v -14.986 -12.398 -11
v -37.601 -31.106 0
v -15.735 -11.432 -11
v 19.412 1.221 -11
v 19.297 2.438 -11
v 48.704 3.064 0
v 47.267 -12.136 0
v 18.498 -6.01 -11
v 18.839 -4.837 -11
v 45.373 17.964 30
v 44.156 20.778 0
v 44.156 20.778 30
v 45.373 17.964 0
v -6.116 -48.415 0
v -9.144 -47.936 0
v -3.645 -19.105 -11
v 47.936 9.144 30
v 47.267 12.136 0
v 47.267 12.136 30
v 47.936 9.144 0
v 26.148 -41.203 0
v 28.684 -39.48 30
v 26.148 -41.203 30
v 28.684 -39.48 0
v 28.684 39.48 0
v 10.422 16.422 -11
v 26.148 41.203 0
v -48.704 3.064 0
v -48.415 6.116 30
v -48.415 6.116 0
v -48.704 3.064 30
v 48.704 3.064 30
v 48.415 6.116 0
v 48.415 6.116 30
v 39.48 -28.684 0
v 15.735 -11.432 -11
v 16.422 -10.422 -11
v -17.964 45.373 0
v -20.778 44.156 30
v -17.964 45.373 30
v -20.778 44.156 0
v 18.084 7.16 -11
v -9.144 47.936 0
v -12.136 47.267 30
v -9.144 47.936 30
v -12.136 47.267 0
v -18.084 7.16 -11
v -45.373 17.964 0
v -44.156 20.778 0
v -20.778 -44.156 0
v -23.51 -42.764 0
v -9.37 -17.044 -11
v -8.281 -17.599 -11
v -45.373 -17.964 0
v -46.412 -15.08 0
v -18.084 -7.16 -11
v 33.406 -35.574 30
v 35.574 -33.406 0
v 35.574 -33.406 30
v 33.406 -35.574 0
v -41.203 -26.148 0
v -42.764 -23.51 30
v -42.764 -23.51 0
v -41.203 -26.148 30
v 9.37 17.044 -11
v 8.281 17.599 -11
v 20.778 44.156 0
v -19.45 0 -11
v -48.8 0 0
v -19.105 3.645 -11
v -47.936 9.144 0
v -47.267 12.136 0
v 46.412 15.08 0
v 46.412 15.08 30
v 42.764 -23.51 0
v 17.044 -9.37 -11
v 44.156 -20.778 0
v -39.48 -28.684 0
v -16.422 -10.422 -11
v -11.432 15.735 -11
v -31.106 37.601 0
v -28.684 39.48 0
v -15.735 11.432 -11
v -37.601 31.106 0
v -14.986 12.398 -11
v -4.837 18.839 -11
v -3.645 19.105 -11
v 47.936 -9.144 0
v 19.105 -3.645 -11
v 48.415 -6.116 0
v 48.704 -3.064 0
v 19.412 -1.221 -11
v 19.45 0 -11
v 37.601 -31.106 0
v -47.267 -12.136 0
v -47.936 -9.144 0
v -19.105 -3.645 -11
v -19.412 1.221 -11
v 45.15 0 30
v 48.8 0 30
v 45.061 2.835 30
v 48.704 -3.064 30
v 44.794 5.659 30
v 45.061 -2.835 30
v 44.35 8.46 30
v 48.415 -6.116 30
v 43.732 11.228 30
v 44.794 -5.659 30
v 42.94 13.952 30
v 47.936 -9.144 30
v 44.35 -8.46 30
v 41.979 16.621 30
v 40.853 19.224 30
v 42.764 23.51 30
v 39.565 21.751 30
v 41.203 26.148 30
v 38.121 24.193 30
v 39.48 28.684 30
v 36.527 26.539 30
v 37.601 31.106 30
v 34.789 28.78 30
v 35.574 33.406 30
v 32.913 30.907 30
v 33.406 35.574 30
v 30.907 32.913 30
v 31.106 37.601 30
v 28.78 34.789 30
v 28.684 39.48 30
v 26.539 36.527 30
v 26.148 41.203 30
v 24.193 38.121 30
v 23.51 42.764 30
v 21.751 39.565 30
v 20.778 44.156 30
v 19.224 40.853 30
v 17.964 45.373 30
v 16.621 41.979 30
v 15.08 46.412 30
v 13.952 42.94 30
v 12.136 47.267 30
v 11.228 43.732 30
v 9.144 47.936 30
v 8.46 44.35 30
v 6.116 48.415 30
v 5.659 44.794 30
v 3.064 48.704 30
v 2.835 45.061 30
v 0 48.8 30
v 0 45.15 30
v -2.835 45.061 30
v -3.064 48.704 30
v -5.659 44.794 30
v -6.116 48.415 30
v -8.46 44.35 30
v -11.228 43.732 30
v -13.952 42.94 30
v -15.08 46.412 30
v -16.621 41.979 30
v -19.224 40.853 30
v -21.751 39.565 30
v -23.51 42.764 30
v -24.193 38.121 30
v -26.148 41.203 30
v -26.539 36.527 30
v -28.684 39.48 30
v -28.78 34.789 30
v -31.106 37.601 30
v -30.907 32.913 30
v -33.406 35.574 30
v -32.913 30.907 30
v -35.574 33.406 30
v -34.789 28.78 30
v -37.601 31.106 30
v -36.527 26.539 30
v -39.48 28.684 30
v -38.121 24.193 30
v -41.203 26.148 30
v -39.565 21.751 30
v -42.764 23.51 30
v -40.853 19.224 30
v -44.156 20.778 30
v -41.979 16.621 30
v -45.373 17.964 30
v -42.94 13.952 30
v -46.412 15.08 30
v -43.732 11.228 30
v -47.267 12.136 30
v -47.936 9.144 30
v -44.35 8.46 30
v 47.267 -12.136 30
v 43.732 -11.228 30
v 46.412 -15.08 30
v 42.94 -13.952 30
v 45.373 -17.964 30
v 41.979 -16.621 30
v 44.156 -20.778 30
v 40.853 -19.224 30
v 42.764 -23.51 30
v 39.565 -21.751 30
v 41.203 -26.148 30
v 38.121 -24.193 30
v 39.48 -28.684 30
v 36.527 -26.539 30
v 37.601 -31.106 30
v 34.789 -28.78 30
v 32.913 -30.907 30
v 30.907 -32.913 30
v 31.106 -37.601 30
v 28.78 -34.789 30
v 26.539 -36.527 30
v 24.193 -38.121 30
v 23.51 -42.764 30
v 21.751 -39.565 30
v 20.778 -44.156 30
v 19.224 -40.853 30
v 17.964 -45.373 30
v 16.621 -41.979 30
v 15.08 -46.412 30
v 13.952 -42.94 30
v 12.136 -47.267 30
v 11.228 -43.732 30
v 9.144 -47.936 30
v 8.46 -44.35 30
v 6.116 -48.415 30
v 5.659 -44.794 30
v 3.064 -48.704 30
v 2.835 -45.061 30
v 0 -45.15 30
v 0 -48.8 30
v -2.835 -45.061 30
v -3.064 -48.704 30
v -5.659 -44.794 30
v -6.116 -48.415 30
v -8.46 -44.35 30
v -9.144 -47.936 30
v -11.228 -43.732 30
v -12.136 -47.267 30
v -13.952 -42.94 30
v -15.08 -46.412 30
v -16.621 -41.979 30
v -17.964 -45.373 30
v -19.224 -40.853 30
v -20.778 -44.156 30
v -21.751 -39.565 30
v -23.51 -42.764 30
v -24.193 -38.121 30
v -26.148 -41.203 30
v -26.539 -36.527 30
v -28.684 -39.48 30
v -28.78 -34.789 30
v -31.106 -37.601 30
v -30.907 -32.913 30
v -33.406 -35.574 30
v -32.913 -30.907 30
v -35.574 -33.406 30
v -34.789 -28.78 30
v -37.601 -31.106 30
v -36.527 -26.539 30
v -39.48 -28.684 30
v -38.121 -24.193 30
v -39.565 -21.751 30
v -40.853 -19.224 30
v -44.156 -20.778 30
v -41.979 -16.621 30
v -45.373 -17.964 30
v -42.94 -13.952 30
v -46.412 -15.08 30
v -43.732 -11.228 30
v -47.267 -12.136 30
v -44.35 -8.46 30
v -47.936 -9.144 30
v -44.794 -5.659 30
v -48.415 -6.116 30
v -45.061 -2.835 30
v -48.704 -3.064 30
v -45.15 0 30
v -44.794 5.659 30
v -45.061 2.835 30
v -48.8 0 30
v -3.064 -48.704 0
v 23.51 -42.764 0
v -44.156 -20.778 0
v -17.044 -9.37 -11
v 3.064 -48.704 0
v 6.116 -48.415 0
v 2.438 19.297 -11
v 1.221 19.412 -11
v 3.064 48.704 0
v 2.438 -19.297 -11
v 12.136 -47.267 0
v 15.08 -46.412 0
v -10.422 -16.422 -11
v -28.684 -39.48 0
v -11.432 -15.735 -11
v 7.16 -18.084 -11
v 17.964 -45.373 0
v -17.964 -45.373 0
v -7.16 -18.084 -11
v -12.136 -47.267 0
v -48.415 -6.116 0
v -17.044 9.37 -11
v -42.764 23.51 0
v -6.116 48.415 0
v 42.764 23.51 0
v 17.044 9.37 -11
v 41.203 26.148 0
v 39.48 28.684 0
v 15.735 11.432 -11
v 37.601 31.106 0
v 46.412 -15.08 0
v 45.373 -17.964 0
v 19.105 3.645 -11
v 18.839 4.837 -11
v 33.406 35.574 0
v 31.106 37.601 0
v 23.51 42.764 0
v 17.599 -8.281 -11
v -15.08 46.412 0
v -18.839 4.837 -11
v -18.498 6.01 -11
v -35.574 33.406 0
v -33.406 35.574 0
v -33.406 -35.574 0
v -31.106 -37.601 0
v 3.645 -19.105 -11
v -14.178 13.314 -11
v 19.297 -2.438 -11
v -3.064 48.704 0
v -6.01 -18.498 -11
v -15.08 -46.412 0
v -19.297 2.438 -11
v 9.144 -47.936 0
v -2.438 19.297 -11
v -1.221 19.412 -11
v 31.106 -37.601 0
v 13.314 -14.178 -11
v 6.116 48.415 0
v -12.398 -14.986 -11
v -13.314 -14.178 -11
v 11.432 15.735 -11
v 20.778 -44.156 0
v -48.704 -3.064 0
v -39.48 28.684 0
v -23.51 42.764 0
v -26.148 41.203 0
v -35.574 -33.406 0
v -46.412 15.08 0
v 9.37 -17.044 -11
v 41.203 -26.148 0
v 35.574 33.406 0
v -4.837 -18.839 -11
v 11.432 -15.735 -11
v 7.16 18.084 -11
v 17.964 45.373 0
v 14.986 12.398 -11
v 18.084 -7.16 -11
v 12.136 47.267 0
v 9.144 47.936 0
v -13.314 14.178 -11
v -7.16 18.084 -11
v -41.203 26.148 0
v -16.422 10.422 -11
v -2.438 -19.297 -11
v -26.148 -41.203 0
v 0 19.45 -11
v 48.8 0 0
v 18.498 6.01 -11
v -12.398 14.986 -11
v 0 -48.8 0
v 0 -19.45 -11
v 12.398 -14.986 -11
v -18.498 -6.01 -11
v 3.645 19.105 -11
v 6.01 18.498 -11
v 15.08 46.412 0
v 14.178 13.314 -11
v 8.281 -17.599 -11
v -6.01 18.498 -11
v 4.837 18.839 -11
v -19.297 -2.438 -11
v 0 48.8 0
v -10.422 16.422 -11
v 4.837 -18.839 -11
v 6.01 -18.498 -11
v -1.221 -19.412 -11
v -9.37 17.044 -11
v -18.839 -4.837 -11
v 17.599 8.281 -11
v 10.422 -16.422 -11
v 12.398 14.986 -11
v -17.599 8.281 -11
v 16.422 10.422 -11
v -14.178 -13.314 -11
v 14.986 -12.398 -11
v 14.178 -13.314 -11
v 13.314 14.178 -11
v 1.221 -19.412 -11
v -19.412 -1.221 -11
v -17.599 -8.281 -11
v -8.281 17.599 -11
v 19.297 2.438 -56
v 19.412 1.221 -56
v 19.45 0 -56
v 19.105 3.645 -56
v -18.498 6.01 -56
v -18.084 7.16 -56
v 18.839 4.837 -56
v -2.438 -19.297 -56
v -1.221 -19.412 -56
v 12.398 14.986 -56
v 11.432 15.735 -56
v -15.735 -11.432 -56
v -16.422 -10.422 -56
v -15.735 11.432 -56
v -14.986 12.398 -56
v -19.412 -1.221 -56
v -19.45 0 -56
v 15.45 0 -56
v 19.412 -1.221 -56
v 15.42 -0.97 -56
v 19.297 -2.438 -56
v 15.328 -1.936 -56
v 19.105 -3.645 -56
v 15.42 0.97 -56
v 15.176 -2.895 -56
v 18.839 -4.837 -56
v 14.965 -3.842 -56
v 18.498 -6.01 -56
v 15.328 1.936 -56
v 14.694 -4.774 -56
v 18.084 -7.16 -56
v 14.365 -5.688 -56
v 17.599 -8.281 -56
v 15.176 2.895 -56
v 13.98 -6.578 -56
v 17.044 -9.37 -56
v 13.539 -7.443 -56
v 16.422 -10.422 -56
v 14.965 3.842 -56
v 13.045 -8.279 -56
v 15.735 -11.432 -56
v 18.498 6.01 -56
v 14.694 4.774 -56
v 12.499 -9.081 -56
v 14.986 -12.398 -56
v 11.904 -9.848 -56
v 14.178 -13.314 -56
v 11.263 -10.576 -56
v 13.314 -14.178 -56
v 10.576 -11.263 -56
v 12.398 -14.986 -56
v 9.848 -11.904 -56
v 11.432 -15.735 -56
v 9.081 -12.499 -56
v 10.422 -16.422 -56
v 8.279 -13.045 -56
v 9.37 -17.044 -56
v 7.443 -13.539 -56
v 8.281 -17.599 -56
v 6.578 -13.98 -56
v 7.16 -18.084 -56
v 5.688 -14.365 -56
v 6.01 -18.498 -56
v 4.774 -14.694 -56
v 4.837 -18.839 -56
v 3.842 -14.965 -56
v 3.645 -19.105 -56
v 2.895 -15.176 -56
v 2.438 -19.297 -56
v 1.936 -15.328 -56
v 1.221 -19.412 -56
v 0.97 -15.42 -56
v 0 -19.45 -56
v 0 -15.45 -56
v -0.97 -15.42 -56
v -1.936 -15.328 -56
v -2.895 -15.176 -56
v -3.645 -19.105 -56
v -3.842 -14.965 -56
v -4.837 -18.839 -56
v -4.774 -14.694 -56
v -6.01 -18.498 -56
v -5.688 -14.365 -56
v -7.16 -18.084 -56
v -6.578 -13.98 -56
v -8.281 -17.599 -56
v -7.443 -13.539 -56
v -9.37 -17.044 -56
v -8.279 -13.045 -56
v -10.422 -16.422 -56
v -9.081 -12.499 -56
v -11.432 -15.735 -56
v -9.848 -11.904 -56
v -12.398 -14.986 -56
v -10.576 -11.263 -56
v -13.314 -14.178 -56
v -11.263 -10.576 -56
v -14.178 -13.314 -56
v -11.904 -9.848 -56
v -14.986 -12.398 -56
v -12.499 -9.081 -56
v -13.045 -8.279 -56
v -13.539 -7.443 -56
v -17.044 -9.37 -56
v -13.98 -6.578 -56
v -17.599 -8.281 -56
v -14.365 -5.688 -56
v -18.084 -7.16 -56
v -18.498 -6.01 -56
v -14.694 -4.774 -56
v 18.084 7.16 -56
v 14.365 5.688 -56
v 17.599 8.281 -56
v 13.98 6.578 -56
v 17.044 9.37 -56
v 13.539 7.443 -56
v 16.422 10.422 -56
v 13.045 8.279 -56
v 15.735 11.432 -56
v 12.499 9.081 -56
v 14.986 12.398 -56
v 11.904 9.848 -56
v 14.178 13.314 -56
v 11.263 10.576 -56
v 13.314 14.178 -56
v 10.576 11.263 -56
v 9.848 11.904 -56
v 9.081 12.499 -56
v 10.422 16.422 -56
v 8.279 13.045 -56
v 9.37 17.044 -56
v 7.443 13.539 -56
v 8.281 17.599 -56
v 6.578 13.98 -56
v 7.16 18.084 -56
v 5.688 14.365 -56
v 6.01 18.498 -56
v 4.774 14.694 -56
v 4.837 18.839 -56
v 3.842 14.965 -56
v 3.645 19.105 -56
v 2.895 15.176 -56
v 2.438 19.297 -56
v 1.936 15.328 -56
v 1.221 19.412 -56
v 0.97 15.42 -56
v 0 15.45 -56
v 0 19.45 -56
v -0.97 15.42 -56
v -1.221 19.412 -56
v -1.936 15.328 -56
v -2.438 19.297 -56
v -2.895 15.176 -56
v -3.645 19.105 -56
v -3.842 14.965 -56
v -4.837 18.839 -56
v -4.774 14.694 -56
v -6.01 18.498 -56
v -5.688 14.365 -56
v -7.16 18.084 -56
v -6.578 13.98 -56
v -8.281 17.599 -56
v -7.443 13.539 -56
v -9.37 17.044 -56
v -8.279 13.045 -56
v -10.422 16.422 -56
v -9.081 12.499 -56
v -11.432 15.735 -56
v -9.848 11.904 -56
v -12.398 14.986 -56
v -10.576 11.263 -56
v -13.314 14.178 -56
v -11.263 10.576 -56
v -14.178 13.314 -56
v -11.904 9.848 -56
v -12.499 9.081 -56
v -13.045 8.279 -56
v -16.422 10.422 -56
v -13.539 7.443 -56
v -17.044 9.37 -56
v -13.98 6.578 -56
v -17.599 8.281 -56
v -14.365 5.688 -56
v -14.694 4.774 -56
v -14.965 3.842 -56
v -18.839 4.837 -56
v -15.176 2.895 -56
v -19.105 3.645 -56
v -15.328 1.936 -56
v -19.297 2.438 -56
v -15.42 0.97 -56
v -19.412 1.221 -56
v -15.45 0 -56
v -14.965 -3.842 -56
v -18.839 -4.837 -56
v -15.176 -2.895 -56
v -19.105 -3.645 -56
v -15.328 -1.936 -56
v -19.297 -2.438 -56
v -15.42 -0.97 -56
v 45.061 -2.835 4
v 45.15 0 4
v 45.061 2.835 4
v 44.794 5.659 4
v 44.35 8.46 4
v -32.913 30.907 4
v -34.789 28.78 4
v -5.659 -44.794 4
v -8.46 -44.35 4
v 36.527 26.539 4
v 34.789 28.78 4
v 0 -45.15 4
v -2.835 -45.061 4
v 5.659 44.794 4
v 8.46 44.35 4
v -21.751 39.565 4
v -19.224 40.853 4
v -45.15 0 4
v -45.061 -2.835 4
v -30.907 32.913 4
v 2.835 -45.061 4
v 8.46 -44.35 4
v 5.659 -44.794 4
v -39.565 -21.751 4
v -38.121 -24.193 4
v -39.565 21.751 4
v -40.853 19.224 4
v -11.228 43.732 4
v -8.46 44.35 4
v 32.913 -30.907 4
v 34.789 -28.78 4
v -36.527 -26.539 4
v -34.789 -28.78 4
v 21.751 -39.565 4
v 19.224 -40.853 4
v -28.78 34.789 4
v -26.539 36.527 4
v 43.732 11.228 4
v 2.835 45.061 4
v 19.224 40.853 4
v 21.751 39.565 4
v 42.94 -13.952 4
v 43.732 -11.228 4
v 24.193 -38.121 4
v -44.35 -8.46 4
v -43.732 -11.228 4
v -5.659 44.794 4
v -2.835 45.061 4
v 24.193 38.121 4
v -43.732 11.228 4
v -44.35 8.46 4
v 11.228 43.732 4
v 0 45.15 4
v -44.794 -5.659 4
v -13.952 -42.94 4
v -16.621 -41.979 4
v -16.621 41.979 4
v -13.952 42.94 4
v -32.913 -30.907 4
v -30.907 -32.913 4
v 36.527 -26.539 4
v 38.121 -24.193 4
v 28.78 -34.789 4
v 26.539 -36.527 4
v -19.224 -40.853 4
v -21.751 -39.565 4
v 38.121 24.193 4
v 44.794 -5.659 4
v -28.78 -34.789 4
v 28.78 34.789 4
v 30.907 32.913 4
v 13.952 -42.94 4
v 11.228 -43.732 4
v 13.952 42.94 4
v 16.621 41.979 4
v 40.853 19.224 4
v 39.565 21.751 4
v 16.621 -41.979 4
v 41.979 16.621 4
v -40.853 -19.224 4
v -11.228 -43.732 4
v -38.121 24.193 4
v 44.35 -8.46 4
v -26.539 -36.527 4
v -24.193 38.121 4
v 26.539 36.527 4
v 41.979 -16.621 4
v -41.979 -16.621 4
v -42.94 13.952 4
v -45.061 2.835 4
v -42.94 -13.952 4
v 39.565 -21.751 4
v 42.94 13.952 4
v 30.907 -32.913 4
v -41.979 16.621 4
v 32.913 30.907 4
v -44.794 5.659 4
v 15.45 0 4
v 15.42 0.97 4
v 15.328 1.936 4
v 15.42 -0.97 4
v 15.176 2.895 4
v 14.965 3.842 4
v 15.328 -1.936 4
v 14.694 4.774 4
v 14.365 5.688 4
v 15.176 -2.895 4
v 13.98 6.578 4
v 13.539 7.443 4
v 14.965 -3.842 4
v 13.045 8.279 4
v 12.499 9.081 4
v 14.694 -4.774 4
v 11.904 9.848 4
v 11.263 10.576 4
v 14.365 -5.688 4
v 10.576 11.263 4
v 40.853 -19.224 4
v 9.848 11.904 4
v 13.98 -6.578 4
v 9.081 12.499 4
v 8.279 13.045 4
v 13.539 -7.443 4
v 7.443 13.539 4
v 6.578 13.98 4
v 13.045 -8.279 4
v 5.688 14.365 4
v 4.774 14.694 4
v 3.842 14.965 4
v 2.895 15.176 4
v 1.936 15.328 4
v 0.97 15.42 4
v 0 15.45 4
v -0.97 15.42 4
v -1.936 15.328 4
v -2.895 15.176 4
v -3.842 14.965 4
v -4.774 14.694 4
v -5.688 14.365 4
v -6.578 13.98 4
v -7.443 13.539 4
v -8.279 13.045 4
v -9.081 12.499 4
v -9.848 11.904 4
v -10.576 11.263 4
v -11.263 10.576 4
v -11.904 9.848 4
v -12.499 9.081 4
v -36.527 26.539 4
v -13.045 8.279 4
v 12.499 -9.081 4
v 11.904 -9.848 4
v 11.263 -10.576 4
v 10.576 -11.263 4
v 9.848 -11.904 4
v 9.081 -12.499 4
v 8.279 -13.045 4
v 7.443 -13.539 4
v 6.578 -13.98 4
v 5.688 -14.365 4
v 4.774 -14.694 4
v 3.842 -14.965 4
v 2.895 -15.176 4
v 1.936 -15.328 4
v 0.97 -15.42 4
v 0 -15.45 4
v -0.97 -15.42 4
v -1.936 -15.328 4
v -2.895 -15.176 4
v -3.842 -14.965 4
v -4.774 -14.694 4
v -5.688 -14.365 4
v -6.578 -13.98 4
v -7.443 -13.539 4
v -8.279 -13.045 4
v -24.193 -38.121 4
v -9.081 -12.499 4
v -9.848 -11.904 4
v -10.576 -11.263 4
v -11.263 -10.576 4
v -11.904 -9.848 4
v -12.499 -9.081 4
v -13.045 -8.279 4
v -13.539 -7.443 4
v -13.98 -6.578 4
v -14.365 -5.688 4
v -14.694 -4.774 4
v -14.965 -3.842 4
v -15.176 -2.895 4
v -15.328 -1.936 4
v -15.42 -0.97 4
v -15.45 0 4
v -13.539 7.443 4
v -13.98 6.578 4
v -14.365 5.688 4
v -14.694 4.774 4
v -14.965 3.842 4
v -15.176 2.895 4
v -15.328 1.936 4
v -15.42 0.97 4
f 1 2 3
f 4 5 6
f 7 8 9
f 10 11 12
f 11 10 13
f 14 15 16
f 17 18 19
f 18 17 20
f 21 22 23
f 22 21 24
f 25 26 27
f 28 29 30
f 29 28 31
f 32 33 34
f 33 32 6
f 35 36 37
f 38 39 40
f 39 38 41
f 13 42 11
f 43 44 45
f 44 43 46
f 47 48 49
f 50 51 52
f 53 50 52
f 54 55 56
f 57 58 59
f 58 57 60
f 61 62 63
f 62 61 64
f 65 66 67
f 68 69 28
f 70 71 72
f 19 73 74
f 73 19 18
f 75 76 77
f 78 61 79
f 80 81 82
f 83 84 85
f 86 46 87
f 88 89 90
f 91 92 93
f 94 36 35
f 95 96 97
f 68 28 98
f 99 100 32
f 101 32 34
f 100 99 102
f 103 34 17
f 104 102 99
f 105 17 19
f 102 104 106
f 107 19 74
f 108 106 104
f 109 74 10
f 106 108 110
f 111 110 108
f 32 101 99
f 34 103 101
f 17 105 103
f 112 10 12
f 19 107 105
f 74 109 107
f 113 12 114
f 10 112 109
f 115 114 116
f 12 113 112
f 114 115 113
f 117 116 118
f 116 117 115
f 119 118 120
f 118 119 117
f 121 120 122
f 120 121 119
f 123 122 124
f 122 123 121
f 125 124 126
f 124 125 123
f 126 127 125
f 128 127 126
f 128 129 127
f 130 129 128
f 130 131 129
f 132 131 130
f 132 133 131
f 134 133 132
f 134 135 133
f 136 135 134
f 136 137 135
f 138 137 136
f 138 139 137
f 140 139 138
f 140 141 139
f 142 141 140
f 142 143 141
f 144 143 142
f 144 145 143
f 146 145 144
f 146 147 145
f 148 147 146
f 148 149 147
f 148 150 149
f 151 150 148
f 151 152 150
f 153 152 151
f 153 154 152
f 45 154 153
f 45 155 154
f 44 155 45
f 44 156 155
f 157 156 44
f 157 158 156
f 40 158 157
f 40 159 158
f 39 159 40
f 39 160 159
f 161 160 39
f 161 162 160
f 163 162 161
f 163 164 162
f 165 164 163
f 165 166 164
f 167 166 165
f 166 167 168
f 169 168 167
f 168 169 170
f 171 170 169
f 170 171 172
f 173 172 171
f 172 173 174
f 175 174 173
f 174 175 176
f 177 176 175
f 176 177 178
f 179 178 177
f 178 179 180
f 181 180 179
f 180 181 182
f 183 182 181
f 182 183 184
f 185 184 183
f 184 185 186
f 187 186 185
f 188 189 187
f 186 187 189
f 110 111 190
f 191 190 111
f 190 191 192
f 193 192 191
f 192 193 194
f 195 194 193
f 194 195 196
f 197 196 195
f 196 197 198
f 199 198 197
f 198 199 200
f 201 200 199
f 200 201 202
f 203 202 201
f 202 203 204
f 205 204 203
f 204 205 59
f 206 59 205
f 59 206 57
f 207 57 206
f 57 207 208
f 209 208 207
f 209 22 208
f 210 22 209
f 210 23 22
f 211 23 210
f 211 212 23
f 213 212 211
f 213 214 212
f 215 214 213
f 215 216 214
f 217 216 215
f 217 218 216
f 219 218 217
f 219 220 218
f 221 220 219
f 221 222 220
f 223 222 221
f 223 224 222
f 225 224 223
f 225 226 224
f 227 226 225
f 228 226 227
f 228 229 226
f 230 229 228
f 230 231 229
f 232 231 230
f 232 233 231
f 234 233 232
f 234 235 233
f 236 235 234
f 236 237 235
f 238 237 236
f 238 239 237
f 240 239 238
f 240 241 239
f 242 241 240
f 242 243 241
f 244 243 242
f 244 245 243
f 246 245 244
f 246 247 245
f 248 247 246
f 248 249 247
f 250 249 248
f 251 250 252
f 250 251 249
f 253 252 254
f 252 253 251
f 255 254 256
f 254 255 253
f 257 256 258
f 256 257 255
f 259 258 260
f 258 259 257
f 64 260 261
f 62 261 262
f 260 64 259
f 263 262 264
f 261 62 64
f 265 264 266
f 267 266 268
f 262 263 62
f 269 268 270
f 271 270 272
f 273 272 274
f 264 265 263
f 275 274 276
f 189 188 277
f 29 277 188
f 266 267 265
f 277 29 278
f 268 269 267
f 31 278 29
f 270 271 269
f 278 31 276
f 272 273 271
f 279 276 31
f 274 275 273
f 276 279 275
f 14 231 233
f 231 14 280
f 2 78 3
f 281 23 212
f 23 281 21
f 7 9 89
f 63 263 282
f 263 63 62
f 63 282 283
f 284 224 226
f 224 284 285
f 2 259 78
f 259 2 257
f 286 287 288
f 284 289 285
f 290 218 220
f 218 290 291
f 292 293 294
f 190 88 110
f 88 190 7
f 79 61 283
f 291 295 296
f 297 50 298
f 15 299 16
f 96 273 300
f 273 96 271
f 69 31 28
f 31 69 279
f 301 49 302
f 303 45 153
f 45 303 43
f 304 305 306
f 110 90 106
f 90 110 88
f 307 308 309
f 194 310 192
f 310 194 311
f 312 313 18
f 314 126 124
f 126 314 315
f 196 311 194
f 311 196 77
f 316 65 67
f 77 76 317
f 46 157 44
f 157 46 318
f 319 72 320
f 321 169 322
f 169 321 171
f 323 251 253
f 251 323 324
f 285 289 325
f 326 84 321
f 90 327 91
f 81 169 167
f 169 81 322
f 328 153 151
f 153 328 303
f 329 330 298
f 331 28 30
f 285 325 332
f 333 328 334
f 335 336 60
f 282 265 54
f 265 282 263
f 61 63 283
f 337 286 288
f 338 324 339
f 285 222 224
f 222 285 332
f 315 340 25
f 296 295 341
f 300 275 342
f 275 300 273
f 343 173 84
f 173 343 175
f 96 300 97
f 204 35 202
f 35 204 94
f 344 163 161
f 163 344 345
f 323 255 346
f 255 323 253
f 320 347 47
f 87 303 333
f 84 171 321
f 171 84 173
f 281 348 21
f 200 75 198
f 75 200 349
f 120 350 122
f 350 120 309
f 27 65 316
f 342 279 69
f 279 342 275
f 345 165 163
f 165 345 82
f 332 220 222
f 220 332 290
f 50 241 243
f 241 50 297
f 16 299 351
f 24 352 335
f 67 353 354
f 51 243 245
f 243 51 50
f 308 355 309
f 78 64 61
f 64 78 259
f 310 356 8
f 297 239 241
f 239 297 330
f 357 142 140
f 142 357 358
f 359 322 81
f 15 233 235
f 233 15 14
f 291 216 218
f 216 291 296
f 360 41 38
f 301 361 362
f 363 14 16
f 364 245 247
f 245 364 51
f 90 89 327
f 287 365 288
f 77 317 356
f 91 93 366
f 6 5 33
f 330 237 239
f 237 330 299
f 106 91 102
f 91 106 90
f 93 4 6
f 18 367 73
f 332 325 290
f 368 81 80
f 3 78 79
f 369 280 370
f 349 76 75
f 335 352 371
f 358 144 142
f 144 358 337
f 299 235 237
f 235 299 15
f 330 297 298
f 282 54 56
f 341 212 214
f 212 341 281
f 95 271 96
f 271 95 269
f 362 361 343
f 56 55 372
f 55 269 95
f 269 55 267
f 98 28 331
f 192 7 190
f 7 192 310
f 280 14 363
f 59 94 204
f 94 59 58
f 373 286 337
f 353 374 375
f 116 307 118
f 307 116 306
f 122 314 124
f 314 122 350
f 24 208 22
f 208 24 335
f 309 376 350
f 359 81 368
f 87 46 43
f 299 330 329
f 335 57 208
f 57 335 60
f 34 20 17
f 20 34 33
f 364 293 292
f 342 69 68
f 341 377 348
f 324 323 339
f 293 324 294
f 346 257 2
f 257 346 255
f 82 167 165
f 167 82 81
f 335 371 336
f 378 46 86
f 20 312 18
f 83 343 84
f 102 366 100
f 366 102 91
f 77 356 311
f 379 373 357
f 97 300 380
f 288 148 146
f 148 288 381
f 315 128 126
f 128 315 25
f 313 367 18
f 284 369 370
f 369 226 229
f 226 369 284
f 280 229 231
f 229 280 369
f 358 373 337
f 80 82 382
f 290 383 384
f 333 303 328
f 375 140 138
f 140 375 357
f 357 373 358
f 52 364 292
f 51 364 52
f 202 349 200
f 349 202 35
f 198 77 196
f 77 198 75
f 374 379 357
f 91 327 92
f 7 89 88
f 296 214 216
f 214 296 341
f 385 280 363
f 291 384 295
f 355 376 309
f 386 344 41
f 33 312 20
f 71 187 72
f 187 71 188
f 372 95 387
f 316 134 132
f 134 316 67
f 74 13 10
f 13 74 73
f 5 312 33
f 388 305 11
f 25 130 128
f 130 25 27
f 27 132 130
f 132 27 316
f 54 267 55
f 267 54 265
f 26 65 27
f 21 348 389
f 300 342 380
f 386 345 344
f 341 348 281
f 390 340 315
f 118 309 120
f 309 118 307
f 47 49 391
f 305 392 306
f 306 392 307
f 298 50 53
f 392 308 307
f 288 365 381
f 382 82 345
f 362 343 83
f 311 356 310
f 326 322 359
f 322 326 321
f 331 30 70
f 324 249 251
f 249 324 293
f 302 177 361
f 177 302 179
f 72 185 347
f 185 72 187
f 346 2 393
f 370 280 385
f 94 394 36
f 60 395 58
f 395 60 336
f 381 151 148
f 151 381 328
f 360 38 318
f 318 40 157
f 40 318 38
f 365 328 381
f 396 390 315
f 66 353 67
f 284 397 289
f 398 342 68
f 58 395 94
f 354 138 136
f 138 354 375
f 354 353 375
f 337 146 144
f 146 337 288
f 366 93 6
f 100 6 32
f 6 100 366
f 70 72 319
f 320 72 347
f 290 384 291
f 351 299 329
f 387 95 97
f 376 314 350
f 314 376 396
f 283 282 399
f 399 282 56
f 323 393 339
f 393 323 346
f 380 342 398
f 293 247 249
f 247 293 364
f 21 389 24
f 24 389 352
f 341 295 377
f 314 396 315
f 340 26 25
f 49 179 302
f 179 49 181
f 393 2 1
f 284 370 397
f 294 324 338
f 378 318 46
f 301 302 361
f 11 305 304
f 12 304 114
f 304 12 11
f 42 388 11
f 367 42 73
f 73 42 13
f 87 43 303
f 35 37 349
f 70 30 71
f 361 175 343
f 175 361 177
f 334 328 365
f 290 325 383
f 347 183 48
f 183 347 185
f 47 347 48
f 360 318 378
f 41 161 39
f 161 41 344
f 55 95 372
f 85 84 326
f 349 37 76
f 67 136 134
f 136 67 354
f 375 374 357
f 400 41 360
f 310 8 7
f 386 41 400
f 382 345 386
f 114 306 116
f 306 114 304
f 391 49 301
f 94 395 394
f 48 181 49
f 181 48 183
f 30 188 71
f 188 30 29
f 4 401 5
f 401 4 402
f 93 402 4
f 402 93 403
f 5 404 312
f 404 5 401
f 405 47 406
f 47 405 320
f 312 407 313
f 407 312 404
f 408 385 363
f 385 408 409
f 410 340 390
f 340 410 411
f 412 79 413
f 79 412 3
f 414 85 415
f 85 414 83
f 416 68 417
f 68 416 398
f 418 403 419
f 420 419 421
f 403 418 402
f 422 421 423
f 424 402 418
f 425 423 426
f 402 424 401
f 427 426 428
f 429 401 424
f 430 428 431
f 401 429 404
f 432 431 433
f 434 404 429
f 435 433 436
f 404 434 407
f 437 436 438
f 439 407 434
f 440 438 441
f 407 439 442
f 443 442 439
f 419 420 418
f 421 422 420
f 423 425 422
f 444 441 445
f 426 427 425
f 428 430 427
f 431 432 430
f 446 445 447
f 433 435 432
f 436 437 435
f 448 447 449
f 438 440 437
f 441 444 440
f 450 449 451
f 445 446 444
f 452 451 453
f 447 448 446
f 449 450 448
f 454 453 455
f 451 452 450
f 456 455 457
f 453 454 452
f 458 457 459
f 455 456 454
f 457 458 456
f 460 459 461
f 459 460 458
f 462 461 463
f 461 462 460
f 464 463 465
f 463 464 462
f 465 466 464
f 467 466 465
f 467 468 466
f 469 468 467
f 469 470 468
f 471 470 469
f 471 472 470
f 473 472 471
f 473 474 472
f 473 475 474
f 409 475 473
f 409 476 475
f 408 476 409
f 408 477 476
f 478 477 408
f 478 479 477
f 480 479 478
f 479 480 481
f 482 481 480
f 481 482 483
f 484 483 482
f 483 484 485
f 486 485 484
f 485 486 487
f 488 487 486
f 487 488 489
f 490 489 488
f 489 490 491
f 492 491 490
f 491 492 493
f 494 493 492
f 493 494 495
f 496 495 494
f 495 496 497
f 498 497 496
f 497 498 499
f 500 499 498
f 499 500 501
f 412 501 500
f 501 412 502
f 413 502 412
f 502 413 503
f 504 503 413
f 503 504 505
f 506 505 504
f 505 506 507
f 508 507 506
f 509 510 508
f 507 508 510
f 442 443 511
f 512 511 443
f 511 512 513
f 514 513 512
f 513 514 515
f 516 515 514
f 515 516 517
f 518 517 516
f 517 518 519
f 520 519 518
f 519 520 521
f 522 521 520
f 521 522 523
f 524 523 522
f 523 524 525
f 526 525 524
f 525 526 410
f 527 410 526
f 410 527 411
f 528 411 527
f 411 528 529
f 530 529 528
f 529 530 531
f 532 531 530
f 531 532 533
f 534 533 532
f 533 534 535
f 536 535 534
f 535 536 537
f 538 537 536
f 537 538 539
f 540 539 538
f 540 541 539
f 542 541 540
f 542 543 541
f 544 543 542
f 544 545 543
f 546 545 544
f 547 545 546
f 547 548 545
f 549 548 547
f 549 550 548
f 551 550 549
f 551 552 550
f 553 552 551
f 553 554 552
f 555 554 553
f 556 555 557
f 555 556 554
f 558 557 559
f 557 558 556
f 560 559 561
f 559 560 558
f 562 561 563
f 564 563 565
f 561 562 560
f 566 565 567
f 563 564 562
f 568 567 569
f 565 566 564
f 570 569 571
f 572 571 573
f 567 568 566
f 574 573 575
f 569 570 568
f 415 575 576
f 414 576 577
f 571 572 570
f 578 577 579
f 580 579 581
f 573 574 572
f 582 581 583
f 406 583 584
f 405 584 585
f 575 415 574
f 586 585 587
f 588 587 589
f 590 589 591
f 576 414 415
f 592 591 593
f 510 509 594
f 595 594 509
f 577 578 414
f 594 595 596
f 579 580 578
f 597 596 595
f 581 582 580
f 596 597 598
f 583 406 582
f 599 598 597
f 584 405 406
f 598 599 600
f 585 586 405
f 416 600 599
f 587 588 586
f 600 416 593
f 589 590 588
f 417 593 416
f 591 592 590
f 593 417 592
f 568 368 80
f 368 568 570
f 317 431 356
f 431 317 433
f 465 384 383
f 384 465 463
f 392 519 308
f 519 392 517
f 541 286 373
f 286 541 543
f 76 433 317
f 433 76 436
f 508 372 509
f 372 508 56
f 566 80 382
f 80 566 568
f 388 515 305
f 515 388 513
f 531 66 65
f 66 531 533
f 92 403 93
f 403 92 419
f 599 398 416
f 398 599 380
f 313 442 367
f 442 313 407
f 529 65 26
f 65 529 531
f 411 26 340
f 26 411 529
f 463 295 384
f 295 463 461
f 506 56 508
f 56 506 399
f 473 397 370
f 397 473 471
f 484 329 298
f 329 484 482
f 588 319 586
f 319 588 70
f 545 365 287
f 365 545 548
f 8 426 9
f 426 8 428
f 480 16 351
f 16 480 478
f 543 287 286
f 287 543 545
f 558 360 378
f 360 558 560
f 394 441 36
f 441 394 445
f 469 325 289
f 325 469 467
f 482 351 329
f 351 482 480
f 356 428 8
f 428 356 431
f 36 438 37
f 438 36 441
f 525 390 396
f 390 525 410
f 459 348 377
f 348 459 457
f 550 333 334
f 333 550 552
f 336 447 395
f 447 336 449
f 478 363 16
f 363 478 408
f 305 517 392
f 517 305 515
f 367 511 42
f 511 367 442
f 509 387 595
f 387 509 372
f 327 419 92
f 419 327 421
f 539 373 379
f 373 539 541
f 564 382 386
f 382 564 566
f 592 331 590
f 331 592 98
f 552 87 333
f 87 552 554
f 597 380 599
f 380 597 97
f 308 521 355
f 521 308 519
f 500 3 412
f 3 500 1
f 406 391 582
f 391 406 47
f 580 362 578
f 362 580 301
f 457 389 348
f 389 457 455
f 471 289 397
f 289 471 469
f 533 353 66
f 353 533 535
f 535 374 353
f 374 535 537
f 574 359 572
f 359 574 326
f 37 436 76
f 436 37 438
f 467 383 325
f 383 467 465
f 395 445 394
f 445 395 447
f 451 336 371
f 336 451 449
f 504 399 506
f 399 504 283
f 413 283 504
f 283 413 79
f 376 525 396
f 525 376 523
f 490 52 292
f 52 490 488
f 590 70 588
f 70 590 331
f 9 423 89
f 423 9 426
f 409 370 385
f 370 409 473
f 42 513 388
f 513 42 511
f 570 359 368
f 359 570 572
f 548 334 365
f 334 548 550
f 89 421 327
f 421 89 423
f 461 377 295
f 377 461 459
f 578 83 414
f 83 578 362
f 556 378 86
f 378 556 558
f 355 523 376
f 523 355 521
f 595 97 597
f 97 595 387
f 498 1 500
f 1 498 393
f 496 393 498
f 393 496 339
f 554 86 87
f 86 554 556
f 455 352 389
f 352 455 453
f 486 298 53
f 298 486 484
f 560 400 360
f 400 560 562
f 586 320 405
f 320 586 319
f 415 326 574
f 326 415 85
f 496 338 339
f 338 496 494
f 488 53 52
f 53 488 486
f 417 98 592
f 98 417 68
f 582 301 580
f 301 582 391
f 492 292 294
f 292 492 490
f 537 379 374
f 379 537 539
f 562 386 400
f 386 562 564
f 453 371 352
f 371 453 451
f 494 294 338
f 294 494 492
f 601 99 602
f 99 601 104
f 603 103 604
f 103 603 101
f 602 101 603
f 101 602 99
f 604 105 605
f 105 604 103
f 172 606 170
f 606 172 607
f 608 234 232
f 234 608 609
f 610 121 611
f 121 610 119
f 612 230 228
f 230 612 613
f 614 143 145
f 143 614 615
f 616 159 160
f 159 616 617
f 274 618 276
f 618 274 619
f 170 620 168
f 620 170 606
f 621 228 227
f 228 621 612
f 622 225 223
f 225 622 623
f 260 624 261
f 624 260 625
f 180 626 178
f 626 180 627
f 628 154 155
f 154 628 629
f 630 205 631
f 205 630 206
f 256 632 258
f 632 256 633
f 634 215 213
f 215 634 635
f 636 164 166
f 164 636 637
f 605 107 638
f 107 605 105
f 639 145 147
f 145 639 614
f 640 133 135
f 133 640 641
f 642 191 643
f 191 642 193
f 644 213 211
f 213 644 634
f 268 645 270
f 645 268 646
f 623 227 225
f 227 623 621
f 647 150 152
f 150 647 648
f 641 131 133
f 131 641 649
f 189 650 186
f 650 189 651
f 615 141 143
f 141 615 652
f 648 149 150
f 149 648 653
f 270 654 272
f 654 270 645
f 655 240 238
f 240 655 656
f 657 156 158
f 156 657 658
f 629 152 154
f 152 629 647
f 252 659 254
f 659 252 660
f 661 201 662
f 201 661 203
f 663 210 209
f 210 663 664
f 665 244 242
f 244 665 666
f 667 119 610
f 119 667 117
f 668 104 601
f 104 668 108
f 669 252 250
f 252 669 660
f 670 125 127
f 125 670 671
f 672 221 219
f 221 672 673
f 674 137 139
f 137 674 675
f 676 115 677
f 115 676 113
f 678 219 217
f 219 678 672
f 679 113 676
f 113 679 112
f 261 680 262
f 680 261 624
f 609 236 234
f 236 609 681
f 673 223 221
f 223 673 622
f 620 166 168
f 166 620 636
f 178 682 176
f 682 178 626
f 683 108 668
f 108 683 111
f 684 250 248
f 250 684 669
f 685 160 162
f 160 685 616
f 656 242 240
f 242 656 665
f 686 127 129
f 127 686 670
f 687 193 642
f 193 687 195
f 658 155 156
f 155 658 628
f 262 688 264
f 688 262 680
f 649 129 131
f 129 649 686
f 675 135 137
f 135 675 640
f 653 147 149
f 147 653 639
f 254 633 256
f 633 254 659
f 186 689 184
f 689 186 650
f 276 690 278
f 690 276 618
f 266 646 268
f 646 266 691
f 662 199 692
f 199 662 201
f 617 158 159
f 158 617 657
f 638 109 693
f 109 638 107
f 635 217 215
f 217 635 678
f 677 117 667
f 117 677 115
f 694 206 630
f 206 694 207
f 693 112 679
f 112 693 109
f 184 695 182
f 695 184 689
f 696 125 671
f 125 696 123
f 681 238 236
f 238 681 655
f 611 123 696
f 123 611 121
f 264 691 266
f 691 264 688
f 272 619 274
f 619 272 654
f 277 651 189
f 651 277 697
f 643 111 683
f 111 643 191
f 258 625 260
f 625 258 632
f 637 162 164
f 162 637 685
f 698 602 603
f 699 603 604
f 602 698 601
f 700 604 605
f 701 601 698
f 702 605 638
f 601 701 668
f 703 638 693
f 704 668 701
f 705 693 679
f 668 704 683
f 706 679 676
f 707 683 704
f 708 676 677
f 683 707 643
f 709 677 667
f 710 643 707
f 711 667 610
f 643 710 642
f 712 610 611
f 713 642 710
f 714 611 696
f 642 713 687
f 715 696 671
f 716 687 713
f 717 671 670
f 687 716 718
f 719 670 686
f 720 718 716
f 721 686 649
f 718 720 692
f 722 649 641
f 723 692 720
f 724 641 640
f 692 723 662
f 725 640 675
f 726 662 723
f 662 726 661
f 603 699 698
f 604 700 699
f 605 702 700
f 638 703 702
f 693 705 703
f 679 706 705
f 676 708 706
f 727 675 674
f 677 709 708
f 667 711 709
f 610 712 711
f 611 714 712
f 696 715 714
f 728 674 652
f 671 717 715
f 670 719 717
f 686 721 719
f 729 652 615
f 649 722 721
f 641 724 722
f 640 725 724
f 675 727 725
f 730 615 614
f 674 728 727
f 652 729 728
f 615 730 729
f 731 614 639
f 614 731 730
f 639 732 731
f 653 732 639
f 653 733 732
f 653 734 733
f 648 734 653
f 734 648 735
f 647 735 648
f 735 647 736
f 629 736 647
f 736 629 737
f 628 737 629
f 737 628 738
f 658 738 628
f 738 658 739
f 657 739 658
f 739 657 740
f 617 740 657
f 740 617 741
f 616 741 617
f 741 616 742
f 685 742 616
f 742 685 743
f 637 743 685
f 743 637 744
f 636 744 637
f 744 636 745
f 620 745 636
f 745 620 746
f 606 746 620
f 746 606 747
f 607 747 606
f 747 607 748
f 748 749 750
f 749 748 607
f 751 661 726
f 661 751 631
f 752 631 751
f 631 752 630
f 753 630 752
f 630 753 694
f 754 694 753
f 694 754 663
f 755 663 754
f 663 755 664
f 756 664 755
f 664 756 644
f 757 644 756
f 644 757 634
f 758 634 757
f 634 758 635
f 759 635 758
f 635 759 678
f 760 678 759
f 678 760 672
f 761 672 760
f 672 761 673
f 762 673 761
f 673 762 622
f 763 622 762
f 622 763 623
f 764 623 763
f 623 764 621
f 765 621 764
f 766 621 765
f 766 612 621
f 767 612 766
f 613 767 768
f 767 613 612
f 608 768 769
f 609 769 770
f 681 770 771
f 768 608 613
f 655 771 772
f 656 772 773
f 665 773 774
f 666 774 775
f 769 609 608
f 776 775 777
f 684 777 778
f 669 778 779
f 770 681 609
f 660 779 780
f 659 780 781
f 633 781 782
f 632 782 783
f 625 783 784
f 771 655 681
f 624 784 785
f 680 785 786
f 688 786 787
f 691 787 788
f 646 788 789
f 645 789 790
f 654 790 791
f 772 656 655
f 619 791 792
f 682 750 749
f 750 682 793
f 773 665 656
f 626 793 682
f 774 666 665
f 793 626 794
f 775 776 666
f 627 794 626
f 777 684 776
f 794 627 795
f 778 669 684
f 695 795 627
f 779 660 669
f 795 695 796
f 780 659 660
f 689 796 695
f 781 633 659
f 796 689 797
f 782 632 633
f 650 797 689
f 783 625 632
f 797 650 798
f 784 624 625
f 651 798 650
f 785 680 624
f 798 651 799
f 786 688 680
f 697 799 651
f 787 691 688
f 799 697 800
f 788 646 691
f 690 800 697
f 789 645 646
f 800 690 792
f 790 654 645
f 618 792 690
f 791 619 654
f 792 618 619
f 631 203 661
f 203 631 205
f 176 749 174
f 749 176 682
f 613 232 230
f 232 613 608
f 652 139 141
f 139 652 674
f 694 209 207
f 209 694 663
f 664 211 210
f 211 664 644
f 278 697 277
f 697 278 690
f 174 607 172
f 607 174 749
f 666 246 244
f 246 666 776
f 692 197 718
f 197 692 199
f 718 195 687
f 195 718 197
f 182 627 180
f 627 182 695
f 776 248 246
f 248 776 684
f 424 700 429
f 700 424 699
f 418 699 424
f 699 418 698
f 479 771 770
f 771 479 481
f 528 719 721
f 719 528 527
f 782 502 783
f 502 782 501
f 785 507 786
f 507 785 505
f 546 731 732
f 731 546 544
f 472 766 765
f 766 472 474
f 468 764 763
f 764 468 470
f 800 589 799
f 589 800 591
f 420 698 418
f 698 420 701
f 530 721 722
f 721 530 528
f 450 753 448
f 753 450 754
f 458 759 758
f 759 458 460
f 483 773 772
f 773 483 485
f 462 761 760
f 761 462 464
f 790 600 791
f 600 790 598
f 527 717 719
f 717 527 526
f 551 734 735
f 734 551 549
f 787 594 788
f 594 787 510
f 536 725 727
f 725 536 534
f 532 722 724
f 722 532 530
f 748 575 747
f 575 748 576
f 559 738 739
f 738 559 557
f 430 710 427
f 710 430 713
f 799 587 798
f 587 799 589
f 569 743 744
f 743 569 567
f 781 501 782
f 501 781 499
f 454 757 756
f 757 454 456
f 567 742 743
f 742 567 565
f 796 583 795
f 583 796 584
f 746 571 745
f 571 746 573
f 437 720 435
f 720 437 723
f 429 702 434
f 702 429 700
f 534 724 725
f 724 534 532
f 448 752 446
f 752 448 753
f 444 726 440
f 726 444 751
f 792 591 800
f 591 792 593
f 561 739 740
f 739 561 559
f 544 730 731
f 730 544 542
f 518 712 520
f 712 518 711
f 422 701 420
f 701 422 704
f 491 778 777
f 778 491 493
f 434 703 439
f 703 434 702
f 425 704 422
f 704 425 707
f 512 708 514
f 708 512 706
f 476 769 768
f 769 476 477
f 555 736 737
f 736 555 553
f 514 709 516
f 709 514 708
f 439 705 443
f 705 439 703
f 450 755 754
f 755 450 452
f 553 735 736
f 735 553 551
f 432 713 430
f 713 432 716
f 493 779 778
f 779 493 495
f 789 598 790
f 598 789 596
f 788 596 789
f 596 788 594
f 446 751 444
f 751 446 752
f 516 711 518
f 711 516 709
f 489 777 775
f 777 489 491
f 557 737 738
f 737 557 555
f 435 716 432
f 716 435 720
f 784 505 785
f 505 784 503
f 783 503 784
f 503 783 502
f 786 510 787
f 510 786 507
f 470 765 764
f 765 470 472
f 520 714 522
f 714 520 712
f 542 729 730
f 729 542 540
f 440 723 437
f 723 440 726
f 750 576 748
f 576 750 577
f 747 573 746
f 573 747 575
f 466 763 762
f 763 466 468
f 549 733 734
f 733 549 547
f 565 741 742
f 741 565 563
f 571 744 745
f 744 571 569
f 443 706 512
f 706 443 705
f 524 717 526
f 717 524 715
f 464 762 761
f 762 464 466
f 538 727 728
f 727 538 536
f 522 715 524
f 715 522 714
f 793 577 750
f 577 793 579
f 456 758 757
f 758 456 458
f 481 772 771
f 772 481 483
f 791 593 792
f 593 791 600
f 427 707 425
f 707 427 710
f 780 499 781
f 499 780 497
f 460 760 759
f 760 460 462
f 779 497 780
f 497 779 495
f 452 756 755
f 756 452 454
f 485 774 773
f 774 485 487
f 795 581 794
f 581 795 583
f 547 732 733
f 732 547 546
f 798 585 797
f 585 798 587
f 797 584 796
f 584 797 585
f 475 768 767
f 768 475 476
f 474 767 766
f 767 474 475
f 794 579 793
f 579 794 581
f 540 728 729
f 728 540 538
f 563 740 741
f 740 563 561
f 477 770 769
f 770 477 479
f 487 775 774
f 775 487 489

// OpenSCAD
use <ThreadMaker.scad>

/* [Hidden] */

//ABS PIPE
$fn=100;
FUDGE=.7; 

// 3" pipe

OD= 88.9 + FUDGE;  // and a 3" pipe isn't exactly a 3" pipe. Geeez.
ID= 78.5 + FUDGE;
THICK= 4;
LENGTH = 30;

XOD = 38.90;
XID = XOD - THICK *2;


difference()
{
    union()
    {
        difference()
        {
            union()
            {
                hull()
                {
                    color("GREEN", .8)
                    cylinder(h = LENGTH, d= (OD + THICK*2));
                    
                    color("BLUE", .8)
                    translate([ 0,0, -LENGTH/2 + THICK])
                    cylinder(h = LENGTH/2 , d= XOD);
                }
                color("BLUE", .8)
                translate([ 0,0, -LENGTH*2 + THICK])
                cylinder(h = LENGTH*2 , d= XOD);
            }
            union()
            {
                translate([0, 0, +THICK])
                cylinder(h = LENGTH, d= (OD + FUDGE));

                translate([ 0,0, -LENGTH*2 + THICK ])
                cylinder(h = LENGTH*2, d = XID);
            }
        }

        //rotate([180, 0, 0 ])
        //make_garden_male(25.4);
    }
}
